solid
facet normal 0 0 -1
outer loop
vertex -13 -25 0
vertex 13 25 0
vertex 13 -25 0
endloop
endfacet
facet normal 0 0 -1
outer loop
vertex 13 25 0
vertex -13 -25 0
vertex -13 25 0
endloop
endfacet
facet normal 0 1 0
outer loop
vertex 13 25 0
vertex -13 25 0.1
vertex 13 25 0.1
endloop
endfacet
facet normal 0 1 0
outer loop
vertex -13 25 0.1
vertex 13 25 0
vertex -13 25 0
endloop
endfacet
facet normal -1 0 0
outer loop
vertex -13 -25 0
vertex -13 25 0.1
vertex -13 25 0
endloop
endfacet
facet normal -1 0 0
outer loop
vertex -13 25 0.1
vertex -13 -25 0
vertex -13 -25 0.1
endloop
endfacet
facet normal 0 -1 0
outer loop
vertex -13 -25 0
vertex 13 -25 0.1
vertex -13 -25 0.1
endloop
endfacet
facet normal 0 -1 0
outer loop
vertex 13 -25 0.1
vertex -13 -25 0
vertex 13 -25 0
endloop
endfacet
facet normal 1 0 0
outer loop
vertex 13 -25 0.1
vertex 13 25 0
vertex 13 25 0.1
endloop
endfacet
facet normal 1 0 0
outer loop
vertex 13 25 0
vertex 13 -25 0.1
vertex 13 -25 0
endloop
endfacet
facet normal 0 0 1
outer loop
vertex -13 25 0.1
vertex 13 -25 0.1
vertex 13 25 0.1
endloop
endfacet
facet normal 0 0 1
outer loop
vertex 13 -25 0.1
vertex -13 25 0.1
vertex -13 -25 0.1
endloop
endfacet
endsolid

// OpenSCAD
// file: ../p/box5-12.scad
use <../lib.scad>
function ldraw_lib__box5_12() = [
// 0 Box with 5 Faces without Any Edges
// 0 Name: box5-12.dat
// 0 Author: Chris Dee [cwdee]
// 0 !LDRAW_ORG Primitive UPDATE 2009-02
// 0 !LICENSE Licensed under CC BY 2.0 and CC BY 4.0 : see CAreadme.txt
// 
// 0 BFC CERTIFY CCW
  [0,"BFC","CERTIFY"],
  [0,"BFC","CCW"],
// 
// 0 !HISTORY 2009-09-03 [PTadmin] Official Update 2009-02
// 
// 
// 4 16 1 1 1 1 1 -1 -1 1 -1 -1 1 1
  [4,16,1,1,1,1,1,-1,-1,1,-1,-1,1,1],
// 4 16 -1 0 1 1 0 1 1 1 1 -1 1 1
  [4,16,-1,0,1,1,0,1,1,1,1,-1,1,1],
// 4 16 -1 0 -1 -1 0 1 -1 1 1 -1 1 -1
  [4,16,-1,0,-1,-1,0,1,-1,1,1,-1,1,-1],
// 4 16 1 0 -1 -1 0 -1 -1 1 -1 1 1 -1
  [4,16,1,0,-1,-1,0,-1,-1,1,-1,1,1,-1],
// 4 16 1 0 1 1 0 -1 1 1 -1 1 1 1
  [4,16,1,0,1,1,0,-1,1,1,-1,1,1,1],
// 0
];
module ldraw_lib__box5_12(step=0, col=false, unit=2/5, alt=false, line=0.2, solid=!$preview)
    makepoly(ldraw_lib__box5_12(), step=step, col=col, unit=unit, alt=alt, line=line, solid=solid);
ldraw_lib__box5_12(line=0.2);
// main file
use <../lib.scad>
use <../p/box5-12.scad>
function ldraw_lib__6022692a() = [
// 0 Sticker  6.3 x  3.3 with Forever Sorting Movie Poster
// 0 Name: 6022692a.dat
// 0 Author: Orion Pobursky [OrionP]
// 0 !LDRAW_ORG Part UPDATE 2022-02
// 0 !LICENSE Licensed under CC BY 2.0 and CC BY 4.0 : see CAreadme.txt
// 
// 0 BFC CERTIFY CCW
  [0,"BFC","CERTIFY"],
  [0,"BFC","CCW"],
// 
// 0 !KEYWORDS set 10232
// 
// 0 !HISTORY 2022-03-06 [PTadmin] Official Update 2022-02
// 
// 
// 1 16 0 -0.25 0 32.5 0 0 0 0.25 0 0 0 62.5 box5-12.dat
  [1,16,0,-0.25,0,32.5,0,0,0,0.25,0,0,0,62.5, ldraw_lib__box5_12()],
// 
// 0 !TEXMAP START PLANAR -32.5 -0.25 62.5 32.5 -0.25 62.5 -32.5 -0.25 -62.5 6022692a.png
// 0 !: 4 15 -32.5 -0.25 62.5 -32.5 -0.25 -62.5 32.5 -0.25 -62.5 32.5 -0.25 62.5
// 0 !TEXMAP FALLBACK
// 4 15 -32.5 -0.25 62.5 -32.5 -0.25 -62.5 32.5 -0.25 -62.5 32.5 -0.25 62.5
  [4,15,-32.5,-0.25,62.5,-32.5,-0.25,-62.5,32.5,-0.25,-62.5,32.5,-0.25,62.5],
// 0 !TEXMAP END
];
module ldraw_lib__6022692a(step=0, col=false, unit=2/5, alt=false, line=0.2, solid=!$preview)
    makepoly(ldraw_lib__6022692a(), step=step, col=col, unit=unit, alt=alt, line=line, solid=solid);
ldraw_lib__6022692a(line=0.2);
